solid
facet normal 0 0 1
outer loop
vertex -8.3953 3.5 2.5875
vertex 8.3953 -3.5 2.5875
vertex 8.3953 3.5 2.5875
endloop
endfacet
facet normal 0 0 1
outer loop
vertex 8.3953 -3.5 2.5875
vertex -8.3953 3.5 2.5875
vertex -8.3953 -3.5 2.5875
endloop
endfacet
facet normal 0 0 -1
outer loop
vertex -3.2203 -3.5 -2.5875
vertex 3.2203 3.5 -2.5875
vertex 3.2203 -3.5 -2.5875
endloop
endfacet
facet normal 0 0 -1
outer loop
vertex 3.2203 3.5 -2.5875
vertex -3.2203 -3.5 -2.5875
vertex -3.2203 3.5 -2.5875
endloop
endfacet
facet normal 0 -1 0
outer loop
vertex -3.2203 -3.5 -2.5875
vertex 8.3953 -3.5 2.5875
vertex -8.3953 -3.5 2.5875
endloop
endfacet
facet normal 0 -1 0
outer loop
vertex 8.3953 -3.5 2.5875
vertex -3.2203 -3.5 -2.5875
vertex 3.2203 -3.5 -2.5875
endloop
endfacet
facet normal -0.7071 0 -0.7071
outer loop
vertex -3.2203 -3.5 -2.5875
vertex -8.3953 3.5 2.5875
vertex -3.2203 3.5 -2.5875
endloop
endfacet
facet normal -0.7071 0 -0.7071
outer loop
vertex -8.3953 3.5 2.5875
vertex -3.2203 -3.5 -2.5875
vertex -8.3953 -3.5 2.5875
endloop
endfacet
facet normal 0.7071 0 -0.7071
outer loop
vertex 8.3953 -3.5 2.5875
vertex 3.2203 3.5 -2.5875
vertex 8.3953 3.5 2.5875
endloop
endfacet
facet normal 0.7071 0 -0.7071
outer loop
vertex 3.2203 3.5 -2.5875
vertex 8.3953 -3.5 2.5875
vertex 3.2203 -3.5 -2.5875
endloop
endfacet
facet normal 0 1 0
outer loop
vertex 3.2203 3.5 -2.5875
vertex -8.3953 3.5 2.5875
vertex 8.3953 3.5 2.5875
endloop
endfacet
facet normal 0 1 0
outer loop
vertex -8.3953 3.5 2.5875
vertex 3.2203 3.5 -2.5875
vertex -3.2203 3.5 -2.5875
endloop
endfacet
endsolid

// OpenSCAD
module side_profile(alpha = 2.325)
{
    translate([0,alpha,0])
    {
        difference()
        {
            translate([0,80,10])
            {
                rotate([0,0,0])
                {
                     box=[200,100,100];
                     cube(box,true);
                }
            }

            translate([0,30,-40])
            {
                rotate([45,0,0])
                {
                     box=[210,25,25];
                     cube(box,true);
                }
            }   
        }
    }   

    translate([0,-alpha,0])
    {
        difference()
        {
            translate([0,-80,10])
            {
                rotate([0,0,0])
                {
                     box=[200,100,100];
                     cube(box,true);
                }
            }

            translate([0,-30,-40])
            {
                rotate([45,0,0])
                {
                     box=[210,25,25];
                     cube(box,true);
                }
            }   
        }
    }   
}

module proto_profile()
{
    rotate([0,45,0])
    {
        difference()
        {
            translate([0,0,0])
            {
                rotate([0,0,0])
                {
                     box=[100,100,100];
                     cube(box,true);
                }
            }

            translate([-35.45,0,35.45])
            {
                rotate([0,45,0])
                {
                     box=[101,101,200];
                     cube(box,true);
                }
            }
        }
    }
}

module bottom_profile()
{
    translate([0,0,-67])
    {
        rotate([0,0,0])
        {
             box=[30,200,20];
             cube(box,true);
        }
    }    
}

module bottom_side_profile()
{
    translate([0,50,-57.0])
    {
        rotate([45,0,0])
        {
             box=[210,10,10];
             cube(box,true);
        }
    }   

    translate([0,-50,-57.0])
    {
        rotate([45,0,0])
        {
             box=[210,10,10];
             cube(box,true);
        }
    }   
}


module inner_profile()
{
    translate([0,0,-82])
    {
        rotate([0,0,0])
        {
             box=[200,55,135];
             cube(box,true);
        }
    }
    
}


module corner_cut_profile()
{
    translate([66.6,-39,0])
    {
        rotate([0,0,45])
        {
             box=[40,20,50];
             cube(box,true);
        }
    } 
    translate([-66.6,-39,0])
    {
        rotate([0,0,135])
        {
             box=[40,20,50];
             cube(box,true);
        }
    } 
    translate([70.2,-15,0])
    {
        rotate([0,0,90])
        {
             box=[40,20,50];
             cube(box,true);
        }
    } 
    translate([-70.2,-15,0])
    {
        rotate([0,0,90])
        {
             box=[40,20,50];
             cube(box,true);
        }
    } 
}

module male_snap()
{    
    
    scale([1.15,1,1.15])
    {
        
        scale([1.50,0.91,1.48])
        {
            
            scale(0.05)
            {   
                scale([1,1.9,1])
                {
                    //corner_cut_profile();
                    difference()
                    {
                        proto_profile();
                        side_profile(alpha = 13);
                        bottom_profile();
                        bottom_side_profile();
                        inner_profile();
                        corner_cut_profile();
                    }        
                }
            }
        }
    }
}



module female_snap()
{
    // Final scaling factor for tweaking.
    // Need to make slightly bigger in x,y,z or the male is smaller.
    scale([1.15,1,1.15])
    {
        difference()
        {
            scale([1.50,1,1.50])
            {
                difference()
                {
                    box = [10,10,3];
                    cube(box,true);

                    translate([0,0,1.519])
                    {

                       scale([0.05,0.05,0.05])
                       {
                           scale([1,1.9,1])
                           {
                               difference()
                                {
                                    proto_profile();
                                    side_profile(alpha = 13);
                                    bottom_profile();
                                    bottom_side_profile();
                                    corner_cut_profile();
                                }
                                
                            } 
                       }      
                       
                    }
                }
            }
            translate([-7,0,-3])
            {
                rotate([0,45,0])
                {
                     box=[11,11,7];
                     cube(box,true);
                }
            }   

            translate([7,0,-3])
            {
                rotate([0,45,0])
                {
                     box=[7,11,11];
                     cube(box,true);
                }
            }
            
            
            
            translate([0,5.5,-2.5])
            {
                rotate([45,0,0])
                {
                     box=[10,2,2];
                     cube(box,true);
                }
            } 

            translate([0,-5.5,-2.5])
            {
                rotate([45,0,0])
                {
                     box=[10,2,2];
                     cube(box,true);
                }
            } 


            
        }
    }
}


module female_snap_adapter()
{
    scale([1.15,1,1.15])
    {
        difference()
        {
            scale([1.50,1,1.50])
            {
                difference()
                {
                    box = [10,10,3];
                    cube(box,true);
                }
            }
            translate([-7,0,-3])
            {
                rotate([0,45,0])
                {
                     box=[11,11,7];
                     cube(box,true);
                }
            }   

            translate([7,0,-3])
            {
                rotate([0,45,0])
                {
                     box=[7,11,11];
                     cube(box,true);
                }
            }
        }
    }
}

/* TEST : Make snaps smaller.*/

module male_snap_stu()
{

    translate([0,1.5,0])
    {
        difference()
        {
            male_snap();
            translate([0,3,0])
            {
                rotate([0,0,0])
                {
                     box=[25,6,15];
                     cube(box,true);
                }
            }
        }
    }


    translate([0,-1.5,0])
    {
        mirror([0,1,0])
        {
            difference()
            {
                male_snap();
                translate([0,3,0])
                {
                    rotate([0,0,0])
                    {
                         box=[25,6,15];
                         cube(box,true);
                    }
                }
            }
        }
    }

}

module female_snap_stu()
{
    
    difference()
    {
    
        union()
        {   
        
            translate([0,1.5,0])
            {
                difference()
                {
                    female_snap();
                    translate([0,4,0])
                    {
                        rotate([0,0,0])
                        {
                             box=[25,8,9];
                             cube(box,true);
                        }
                    }
                }
            }


            translate([0,-1.5,0])
            {
                mirror([0,1,0])
                {
                    difference()
                    {
                        female_snap();
                        translate([0,4,0])
                        {
                            rotate([0,0,0])
                            {
                                 box=[25,8,9];
                                 cube(box,true);
                            }
                        }
                    }
                }
            }
            
        }
    }  
}


module female_snap_adapter_modified()
{
    
    difference()
    {
    
        union()
        {   
        
            translate([0,1.5,0])
            {
                difference()
                {
                    female_snap_adapter();
                    translate([0,4,0])
                    {
                        rotate([0,0,0])
                        {
                             box=[25,8,9];
                             cube(box,true);
                        }
                    }
                }
            }


            translate([0,-1.5,0])
            {
                mirror([0,1,0])
                {
                    difference()
                    {
                        female_snap_adapter();
                        translate([0,4,0])
                        {
                            rotate([0,0,0])
                            {
                                 box=[25,8,9];
                                 cube(box,true);
                            }
                        }
                    }
                }
            }
        }
    }  
}



female_snap_adapter_modified();
//female_snap_stu();
translate([0,0,10])
{
    //male_snap_stu();
}




scale([0,0,0])
{
    scale([0,0,0])
    {
         box=[100,100,100];
         cube(box,true);
    }
}
